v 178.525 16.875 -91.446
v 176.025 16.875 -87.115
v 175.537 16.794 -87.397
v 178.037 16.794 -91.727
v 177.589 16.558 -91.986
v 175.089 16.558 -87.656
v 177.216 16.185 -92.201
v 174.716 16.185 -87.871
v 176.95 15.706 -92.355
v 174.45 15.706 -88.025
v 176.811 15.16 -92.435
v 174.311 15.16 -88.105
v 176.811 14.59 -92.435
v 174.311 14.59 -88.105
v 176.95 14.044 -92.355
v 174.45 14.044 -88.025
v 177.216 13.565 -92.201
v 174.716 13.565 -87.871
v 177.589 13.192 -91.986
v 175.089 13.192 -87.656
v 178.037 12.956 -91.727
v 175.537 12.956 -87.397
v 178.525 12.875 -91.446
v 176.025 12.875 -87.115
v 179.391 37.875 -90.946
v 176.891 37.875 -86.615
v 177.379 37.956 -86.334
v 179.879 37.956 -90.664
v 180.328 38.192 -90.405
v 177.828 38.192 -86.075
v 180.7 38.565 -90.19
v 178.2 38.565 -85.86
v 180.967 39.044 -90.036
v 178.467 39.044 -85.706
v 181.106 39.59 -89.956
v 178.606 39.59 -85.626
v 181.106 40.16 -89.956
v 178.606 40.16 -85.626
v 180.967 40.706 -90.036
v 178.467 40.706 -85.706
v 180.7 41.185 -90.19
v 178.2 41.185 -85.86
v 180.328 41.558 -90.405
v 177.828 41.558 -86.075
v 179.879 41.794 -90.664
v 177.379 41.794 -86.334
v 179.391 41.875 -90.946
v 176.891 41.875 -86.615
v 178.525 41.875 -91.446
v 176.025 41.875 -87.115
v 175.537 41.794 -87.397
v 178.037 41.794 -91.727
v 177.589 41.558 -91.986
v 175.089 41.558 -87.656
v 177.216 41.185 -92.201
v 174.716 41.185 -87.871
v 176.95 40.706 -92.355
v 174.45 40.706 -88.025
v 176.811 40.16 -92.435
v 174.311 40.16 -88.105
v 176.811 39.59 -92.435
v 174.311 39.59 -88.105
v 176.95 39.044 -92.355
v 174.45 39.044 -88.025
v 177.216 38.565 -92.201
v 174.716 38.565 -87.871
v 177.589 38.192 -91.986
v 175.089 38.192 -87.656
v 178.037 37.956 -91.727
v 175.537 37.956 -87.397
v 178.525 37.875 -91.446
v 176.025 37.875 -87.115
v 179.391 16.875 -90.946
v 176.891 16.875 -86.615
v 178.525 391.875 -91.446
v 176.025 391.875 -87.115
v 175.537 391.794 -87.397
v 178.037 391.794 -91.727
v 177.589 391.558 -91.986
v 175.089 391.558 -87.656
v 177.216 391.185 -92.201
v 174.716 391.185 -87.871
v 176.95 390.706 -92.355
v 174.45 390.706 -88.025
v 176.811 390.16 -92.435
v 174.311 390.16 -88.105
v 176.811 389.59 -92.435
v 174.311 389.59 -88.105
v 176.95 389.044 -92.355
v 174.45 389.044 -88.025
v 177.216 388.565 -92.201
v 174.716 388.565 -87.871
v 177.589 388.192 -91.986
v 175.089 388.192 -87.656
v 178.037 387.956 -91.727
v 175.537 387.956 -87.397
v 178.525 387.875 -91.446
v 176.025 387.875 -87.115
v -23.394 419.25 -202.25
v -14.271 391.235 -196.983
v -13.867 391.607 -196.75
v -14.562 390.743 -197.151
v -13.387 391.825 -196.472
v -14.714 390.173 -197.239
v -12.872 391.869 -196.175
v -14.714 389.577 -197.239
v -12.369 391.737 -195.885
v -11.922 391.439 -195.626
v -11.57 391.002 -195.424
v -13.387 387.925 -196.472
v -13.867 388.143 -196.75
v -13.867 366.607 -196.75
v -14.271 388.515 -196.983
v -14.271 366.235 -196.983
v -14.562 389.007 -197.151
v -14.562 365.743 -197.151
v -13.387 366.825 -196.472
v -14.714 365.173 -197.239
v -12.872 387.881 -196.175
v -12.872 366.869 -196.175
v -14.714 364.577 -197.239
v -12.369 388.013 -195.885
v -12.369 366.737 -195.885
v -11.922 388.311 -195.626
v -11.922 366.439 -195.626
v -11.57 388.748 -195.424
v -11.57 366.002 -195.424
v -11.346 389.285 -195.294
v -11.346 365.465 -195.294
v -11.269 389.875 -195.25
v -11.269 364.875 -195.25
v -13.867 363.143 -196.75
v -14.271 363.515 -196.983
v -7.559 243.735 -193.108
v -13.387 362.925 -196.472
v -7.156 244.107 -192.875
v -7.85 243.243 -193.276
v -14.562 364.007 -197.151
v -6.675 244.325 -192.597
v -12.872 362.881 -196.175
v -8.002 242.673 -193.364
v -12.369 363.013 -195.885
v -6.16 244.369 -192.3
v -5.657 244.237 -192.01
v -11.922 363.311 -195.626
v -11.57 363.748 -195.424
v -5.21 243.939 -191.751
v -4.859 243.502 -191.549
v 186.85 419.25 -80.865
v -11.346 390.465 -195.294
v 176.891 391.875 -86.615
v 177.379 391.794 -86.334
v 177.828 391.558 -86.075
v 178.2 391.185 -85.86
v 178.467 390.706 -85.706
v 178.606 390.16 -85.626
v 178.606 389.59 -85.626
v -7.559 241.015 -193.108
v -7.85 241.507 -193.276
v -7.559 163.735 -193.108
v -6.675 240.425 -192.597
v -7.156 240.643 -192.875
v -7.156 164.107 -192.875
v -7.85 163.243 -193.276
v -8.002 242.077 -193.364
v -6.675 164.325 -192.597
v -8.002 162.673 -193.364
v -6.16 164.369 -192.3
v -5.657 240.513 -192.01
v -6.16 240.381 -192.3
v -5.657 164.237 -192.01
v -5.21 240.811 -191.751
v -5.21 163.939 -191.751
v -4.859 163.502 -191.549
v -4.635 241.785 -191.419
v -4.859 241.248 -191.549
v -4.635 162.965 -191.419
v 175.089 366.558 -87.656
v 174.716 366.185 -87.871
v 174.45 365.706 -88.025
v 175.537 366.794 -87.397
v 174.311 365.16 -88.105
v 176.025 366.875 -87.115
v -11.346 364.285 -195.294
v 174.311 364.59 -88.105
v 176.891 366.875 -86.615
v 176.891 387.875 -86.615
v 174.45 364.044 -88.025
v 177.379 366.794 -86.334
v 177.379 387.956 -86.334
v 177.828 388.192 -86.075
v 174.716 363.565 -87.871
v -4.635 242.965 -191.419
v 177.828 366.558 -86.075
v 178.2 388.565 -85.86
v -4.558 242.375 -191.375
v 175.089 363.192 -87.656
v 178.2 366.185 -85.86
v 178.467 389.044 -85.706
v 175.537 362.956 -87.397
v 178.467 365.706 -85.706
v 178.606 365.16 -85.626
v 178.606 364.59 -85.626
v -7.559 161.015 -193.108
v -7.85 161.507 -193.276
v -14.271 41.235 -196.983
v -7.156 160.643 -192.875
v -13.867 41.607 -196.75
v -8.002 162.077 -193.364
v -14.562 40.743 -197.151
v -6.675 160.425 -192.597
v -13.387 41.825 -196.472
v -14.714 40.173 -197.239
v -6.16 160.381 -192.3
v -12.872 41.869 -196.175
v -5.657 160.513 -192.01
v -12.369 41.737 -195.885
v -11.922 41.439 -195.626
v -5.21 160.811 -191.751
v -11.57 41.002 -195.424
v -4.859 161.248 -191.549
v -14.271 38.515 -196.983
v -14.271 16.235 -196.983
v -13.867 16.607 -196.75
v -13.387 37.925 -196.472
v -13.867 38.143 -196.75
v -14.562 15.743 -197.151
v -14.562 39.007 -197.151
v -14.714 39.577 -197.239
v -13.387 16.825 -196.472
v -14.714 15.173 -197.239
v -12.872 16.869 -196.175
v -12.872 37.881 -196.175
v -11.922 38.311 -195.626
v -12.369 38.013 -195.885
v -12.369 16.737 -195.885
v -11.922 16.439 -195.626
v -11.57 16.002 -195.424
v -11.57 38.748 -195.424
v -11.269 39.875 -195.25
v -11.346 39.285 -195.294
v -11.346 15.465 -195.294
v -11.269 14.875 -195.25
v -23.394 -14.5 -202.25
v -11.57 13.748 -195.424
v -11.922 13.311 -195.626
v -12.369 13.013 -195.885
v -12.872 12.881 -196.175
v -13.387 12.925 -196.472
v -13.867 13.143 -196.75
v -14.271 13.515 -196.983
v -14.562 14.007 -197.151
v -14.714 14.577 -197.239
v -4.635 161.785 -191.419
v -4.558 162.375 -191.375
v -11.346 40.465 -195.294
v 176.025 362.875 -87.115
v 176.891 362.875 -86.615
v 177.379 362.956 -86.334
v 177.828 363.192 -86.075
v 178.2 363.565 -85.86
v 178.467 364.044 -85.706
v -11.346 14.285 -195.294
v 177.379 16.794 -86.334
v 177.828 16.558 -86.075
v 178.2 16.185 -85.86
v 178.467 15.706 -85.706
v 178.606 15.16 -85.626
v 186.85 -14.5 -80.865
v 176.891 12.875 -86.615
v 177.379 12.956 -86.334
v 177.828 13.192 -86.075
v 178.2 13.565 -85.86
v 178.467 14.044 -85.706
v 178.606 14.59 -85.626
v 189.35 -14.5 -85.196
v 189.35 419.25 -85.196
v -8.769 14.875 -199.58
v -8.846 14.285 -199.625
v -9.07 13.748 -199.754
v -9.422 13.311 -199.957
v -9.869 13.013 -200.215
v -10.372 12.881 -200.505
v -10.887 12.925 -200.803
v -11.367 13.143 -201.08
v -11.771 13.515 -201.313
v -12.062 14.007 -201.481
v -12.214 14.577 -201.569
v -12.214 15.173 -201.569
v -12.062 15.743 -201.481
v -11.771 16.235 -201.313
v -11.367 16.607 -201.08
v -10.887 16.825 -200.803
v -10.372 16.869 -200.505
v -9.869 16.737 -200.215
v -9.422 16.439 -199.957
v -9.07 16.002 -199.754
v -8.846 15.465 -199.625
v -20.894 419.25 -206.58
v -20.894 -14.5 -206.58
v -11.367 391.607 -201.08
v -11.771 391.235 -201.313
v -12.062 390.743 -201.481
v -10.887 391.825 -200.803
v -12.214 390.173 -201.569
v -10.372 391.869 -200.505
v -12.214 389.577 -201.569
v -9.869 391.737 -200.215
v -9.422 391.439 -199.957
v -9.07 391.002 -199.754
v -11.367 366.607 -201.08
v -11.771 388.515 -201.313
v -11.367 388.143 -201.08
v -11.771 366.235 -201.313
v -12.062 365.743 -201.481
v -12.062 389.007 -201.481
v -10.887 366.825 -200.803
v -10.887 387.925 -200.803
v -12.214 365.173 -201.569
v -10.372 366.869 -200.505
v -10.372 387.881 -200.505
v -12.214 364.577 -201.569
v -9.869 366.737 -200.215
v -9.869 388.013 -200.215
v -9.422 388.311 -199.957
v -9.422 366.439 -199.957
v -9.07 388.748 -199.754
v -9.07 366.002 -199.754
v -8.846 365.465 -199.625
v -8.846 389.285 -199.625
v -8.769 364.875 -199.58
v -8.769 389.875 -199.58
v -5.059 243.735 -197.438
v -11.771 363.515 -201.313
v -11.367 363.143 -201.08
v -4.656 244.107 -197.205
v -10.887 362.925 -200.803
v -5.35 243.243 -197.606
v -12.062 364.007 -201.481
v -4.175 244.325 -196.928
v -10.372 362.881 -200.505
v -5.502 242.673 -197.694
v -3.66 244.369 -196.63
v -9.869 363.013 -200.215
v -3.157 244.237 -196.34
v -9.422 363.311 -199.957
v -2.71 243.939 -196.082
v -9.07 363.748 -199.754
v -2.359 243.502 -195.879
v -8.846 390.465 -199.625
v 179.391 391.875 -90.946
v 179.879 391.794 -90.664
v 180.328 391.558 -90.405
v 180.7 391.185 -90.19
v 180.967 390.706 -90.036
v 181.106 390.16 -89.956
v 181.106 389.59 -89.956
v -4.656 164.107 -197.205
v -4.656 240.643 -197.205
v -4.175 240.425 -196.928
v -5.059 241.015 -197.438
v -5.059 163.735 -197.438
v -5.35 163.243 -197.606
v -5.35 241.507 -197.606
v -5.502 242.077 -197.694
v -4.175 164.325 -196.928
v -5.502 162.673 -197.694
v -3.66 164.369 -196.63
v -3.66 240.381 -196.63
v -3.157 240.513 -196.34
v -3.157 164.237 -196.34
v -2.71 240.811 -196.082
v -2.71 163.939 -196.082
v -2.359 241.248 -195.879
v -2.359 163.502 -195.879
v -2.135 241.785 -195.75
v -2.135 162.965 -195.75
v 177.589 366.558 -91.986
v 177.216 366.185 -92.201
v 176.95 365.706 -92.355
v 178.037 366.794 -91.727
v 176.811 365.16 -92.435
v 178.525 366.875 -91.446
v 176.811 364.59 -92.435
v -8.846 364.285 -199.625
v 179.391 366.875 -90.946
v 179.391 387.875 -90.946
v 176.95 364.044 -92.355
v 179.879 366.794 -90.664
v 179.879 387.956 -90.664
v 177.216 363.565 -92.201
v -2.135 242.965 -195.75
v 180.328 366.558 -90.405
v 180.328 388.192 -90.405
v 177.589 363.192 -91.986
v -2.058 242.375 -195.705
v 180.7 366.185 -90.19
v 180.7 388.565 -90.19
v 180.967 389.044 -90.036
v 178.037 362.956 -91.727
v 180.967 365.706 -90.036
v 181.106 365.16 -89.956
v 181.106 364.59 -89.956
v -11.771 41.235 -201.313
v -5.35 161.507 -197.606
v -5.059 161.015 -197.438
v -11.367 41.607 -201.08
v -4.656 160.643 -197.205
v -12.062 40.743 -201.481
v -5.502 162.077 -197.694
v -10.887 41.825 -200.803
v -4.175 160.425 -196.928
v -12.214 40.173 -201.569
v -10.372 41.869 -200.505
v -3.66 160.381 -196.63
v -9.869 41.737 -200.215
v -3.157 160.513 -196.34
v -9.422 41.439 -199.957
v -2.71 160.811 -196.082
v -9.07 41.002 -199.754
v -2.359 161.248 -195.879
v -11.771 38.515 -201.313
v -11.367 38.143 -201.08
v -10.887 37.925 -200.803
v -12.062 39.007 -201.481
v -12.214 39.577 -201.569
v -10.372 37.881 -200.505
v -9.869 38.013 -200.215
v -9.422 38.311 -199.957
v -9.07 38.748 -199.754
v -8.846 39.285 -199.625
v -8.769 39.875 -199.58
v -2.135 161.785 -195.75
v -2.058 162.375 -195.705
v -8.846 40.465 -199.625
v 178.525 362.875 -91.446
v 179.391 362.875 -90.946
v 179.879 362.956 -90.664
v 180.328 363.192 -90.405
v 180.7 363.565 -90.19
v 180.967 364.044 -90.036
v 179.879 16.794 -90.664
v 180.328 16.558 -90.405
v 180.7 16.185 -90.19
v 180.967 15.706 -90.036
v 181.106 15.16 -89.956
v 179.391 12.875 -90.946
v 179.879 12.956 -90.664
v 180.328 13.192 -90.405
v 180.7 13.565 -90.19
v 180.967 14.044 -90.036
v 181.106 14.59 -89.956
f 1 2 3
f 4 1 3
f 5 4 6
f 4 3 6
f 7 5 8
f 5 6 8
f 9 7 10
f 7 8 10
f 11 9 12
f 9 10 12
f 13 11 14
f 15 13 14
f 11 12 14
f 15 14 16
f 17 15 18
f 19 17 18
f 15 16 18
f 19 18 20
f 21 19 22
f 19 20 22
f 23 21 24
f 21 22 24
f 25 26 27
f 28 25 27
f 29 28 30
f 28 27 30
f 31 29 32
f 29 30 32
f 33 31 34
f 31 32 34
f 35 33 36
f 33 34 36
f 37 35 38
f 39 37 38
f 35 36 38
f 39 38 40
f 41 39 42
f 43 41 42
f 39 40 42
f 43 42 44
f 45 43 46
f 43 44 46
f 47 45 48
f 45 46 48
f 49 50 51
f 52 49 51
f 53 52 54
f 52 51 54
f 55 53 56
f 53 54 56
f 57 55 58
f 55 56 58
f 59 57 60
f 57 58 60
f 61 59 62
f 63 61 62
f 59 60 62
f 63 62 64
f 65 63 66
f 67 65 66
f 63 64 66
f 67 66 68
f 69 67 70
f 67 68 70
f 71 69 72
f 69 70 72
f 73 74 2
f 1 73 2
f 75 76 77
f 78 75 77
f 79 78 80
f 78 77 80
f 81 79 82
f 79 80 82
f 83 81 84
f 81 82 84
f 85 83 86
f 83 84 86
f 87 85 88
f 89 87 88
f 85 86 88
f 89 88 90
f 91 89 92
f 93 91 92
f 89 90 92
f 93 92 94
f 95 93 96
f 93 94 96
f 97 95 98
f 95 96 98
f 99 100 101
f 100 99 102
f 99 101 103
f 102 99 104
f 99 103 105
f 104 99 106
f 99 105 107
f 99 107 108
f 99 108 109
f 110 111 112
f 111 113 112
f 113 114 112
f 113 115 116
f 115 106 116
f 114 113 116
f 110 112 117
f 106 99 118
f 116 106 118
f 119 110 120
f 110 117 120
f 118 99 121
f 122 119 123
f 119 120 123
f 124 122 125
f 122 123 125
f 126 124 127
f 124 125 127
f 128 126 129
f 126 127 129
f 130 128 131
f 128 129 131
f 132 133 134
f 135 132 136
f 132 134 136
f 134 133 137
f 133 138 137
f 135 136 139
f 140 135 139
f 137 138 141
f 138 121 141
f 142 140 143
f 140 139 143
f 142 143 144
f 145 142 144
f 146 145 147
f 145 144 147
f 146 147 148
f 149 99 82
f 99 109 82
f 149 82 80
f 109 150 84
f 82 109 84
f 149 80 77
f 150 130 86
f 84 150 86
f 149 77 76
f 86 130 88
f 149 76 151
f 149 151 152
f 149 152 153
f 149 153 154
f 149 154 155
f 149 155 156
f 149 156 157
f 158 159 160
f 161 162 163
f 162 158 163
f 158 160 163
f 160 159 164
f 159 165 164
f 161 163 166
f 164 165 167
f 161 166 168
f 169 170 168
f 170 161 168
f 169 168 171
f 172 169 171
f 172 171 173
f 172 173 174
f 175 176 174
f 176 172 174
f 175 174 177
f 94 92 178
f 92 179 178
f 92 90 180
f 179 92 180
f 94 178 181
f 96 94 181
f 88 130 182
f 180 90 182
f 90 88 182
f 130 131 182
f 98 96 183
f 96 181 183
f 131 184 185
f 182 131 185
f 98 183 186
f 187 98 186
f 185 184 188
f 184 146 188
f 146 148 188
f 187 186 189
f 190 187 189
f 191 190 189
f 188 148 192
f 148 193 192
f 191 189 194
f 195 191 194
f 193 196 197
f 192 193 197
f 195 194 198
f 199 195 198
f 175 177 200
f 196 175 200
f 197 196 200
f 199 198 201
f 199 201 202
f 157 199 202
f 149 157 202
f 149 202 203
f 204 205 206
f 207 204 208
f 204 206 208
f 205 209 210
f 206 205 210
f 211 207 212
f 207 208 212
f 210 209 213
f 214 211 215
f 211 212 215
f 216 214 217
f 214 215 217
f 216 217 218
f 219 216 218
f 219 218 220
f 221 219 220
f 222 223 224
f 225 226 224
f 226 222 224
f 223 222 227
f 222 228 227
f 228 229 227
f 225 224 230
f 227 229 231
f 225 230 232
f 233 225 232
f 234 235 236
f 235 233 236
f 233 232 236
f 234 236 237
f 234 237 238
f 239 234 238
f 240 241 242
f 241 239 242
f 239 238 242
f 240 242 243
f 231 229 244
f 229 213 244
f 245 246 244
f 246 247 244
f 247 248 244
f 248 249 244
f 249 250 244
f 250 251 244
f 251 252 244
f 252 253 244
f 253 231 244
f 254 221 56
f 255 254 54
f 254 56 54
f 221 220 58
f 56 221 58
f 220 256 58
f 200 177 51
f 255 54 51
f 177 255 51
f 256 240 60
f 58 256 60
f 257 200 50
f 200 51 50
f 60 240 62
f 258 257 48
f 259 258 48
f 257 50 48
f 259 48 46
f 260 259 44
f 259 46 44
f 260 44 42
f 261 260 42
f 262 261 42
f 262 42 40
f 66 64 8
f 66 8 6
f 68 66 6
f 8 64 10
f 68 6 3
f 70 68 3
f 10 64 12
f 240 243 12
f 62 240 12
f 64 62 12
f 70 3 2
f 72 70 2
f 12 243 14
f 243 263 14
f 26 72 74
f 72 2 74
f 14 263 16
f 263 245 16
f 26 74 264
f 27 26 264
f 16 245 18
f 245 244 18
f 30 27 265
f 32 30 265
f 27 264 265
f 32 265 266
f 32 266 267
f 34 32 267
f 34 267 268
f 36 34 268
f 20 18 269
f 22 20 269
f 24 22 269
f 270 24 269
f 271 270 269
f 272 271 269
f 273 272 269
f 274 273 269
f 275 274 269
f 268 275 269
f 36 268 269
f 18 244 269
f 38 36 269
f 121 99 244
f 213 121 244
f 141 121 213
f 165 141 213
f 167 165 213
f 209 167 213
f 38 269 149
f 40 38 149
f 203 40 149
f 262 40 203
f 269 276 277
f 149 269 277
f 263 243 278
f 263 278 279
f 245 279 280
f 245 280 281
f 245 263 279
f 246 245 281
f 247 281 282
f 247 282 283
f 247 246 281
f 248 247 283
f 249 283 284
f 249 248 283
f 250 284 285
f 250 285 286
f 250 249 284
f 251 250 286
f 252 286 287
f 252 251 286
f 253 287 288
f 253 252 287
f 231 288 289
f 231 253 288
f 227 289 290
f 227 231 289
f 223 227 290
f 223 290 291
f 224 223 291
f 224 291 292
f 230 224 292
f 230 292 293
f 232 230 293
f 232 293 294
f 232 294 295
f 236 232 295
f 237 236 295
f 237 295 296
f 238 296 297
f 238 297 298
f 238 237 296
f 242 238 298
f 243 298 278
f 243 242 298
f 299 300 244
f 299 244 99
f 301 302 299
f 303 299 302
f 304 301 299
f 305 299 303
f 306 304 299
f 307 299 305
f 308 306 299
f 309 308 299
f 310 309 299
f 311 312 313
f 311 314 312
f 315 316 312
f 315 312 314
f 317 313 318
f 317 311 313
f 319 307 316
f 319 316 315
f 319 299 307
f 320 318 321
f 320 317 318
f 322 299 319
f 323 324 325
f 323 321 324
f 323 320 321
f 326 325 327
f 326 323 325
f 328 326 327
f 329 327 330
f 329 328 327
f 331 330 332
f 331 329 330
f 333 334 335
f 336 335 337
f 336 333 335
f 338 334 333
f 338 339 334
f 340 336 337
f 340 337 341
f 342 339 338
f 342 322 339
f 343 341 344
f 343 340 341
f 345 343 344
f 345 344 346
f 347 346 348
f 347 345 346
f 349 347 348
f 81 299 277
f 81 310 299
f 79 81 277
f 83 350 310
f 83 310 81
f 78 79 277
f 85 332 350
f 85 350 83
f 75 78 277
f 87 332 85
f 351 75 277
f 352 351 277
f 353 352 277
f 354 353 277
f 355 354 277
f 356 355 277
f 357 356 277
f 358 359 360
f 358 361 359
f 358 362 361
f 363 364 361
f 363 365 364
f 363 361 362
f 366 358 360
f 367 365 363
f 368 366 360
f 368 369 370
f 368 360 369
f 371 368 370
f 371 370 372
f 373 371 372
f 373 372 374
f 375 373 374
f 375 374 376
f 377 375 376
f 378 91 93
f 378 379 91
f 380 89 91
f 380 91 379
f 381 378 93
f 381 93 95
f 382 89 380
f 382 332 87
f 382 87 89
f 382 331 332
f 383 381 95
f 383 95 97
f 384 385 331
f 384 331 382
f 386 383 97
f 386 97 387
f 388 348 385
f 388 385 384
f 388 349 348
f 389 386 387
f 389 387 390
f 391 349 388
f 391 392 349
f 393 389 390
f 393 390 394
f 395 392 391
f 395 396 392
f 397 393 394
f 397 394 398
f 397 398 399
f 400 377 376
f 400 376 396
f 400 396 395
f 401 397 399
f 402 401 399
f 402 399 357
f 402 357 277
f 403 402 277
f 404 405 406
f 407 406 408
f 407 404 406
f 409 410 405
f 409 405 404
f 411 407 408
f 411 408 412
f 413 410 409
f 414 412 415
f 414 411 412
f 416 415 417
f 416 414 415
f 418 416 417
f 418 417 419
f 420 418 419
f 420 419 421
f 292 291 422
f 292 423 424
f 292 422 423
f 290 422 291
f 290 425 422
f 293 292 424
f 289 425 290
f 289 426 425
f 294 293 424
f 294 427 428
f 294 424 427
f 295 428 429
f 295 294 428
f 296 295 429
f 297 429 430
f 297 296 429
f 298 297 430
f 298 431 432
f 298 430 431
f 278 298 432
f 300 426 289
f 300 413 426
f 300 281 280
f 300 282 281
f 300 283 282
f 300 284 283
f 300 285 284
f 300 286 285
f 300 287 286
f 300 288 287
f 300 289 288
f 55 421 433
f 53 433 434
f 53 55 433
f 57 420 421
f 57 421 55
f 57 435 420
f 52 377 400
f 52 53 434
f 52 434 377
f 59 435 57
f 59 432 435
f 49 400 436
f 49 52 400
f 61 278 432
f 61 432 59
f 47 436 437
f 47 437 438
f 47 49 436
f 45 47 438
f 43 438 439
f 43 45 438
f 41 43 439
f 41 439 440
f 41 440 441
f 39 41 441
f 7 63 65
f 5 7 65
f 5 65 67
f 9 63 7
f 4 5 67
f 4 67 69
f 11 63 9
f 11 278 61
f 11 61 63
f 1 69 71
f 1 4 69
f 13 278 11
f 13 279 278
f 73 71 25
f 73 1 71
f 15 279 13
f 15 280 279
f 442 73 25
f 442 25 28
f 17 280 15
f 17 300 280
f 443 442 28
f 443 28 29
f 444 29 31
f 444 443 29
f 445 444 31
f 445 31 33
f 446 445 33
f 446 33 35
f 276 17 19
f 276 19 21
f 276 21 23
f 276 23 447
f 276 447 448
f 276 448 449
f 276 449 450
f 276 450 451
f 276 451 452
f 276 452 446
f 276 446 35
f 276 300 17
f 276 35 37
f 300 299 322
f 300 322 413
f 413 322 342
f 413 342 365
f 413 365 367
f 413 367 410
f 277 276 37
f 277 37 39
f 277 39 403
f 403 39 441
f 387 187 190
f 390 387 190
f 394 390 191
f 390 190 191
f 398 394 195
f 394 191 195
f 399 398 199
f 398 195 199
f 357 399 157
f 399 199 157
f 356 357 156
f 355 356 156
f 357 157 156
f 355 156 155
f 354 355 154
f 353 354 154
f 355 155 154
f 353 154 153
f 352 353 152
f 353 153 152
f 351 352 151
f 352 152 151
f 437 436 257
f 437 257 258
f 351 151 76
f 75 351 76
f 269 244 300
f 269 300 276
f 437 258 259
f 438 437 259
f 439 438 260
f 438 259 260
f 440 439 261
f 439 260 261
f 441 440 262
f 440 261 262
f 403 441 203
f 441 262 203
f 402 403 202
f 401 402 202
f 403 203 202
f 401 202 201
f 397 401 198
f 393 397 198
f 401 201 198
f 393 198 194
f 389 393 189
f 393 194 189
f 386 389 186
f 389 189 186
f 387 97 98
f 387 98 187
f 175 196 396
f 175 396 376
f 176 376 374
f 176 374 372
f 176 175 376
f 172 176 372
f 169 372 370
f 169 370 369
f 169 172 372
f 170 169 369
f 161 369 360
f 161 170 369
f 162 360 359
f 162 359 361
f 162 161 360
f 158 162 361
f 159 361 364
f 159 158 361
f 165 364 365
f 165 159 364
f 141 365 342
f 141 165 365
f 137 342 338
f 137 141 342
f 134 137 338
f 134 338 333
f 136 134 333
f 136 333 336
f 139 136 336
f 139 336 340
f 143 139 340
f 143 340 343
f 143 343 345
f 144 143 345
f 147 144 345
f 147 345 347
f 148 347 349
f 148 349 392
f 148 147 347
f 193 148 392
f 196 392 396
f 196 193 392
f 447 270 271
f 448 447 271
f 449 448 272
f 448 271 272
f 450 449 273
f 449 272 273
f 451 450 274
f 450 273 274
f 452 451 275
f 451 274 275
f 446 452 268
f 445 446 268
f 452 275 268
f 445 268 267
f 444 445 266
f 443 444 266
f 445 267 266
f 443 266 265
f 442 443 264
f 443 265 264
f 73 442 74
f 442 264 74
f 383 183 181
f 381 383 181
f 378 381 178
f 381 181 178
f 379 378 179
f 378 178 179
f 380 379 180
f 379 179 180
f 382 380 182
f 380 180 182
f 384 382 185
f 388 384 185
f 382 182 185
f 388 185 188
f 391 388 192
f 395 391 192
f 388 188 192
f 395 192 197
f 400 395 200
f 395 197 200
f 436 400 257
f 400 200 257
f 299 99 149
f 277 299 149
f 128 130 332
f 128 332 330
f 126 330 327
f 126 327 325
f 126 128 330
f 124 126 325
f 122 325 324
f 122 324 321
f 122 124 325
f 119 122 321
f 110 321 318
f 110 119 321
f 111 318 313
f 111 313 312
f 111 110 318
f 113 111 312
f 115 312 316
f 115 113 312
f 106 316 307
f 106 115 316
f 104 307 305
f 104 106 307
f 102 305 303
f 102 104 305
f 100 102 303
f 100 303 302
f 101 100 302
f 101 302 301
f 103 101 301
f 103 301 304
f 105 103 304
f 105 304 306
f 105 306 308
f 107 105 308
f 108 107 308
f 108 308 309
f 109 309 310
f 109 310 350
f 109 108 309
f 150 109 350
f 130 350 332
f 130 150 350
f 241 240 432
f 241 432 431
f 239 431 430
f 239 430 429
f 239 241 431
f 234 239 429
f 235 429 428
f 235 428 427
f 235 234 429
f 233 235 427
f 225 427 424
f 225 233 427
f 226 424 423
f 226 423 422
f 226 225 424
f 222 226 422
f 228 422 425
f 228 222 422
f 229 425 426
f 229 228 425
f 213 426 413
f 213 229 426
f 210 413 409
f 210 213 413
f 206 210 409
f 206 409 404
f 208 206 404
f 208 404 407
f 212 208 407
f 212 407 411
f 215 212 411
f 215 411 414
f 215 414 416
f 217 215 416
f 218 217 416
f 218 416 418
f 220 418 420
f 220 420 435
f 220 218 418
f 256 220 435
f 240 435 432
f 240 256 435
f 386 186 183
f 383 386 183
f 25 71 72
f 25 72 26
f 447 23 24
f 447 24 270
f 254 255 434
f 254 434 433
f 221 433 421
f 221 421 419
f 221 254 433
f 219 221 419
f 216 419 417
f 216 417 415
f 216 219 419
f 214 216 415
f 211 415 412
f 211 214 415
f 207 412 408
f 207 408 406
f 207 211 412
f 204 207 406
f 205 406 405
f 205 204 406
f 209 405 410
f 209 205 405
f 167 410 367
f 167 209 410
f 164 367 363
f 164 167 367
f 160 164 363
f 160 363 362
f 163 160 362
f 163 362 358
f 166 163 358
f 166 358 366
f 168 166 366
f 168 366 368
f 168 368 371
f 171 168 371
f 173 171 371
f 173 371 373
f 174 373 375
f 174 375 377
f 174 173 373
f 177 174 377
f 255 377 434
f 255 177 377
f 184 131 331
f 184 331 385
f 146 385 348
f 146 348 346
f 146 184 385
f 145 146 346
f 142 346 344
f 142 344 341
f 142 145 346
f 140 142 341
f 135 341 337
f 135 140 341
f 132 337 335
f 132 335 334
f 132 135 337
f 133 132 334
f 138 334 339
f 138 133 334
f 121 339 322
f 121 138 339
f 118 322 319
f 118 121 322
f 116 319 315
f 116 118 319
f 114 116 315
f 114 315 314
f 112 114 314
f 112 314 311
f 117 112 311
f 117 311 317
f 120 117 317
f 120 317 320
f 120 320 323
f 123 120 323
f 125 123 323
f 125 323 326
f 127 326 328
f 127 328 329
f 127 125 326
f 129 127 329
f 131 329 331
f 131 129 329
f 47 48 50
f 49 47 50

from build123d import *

# Parameters (mm, degrees)
STOCK_ACRYLIC_DOOR_MASTER_1_START     = 163.456714755
STOCK_ACRYLIC_DOOR_MASTER_1_OUTLINE_W = 243.269145362
STOCK_ACRYLIC_DOOR_MASTER_1_OUTLINE_H = 433.75
STOCK_ACRYLIC_DOOR_MASTER_1_OUTLINE_R = 2
STOCK_ACRYLIC_DOOR_MASTER_1_DEPTH     = 5
SKETCH1_W                             = 0.25
SKETCH1_H                             = 433.75
CUT_EXTRUDE1_DEPTH                    = 438.771536387


# Read off the part's stored shape, not the designer's step: Stock-acrylic-door-master-1
with BuildPart() as part:
    # Stock-acrylic-door-master-1 outline → Stock-acrylic-door-master-1 (new body)
    with BuildSketch(Plane(origin=(0, 0, 0), x_dir=(0.866025403784438, 0, 0.500000000000001), z_dir=(0.500000000000001, 0, -0.866025403784438)).offset(STOCK_ACRYLIC_DOOR_MASTER_1_START)):
        with Locations((0, -202.375)):
            Rectangle(STOCK_ACRYLIC_DOOR_MASTER_1_OUTLINE_W, STOCK_ACRYLIC_DOOR_MASTER_1_OUTLINE_H)
        with Locations((-109.384572681, -389.875)):
            Circle(STOCK_ACRYLIC_DOOR_MASTER_1_OUTLINE_R, mode=Mode.SUBTRACT)
        with Locations((-109.384572681, -364.875)):
            Circle(STOCK_ACRYLIC_DOOR_MASTER_1_OUTLINE_R, mode=Mode.SUBTRACT)
        with Locations((-101.634572681, -242.375)):
            Circle(STOCK_ACRYLIC_DOOR_MASTER_1_OUTLINE_R, mode=Mode.SUBTRACT)
        with BuildLine():
            Line((108.884572681, -387.875), (109.884572681, -387.875))
            ThreePointArc((109.884572681, -387.875), (111.884572681, -389.875), (109.884572681, -391.875))
            Line((109.884572681, -391.875), (108.884572681, -391.875))
            ThreePointArc((108.884572681, -391.875), (106.884572681, -389.875), (108.884572681, -387.875))
        make_face(mode=Mode.SUBTRACT)
        with BuildLine():
            Line((108.884572681, -362.875), (109.884572681, -362.875))
            ThreePointArc((109.884572681, -362.875), (111.884572681, -364.875), (109.884572681, -366.875))
            Line((109.884572681, -366.875), (108.884572681, -366.875))
            ThreePointArc((108.884572681, -366.875), (106.884572681, -364.875), (108.884572681, -362.875))
        make_face(mode=Mode.SUBTRACT)
        with Locations((-101.634572681, -162.375)):
            Circle(STOCK_ACRYLIC_DOOR_MASTER_1_OUTLINE_R, mode=Mode.SUBTRACT)
        with Locations((-109.384572681, -39.875)):
            Circle(STOCK_ACRYLIC_DOOR_MASTER_1_OUTLINE_R, mode=Mode.SUBTRACT)
        with Locations((-109.384572681, -14.875)):
            Circle(STOCK_ACRYLIC_DOOR_MASTER_1_OUTLINE_R, mode=Mode.SUBTRACT)
        with BuildLine():
            Line((108.884572681, -37.875), (109.884572681, -37.875))
            ThreePointArc((109.884572681, -37.875), (111.884572681, -39.875), (109.884572681, -41.875))
            Line((109.884572681, -41.875), (108.884572681, -41.875))
            ThreePointArc((108.884572681, -41.875), (106.884572681, -39.875), (108.884572681, -37.875))
        make_face(mode=Mode.SUBTRACT)
        with BuildLine():
            Line((108.884572681, -12.875), (109.884572681, -12.875))
            ThreePointArc((109.884572681, -12.875), (111.884572681, -14.875), (109.884572681, -16.875))
            Line((109.884572681, -16.875), (108.884572681, -16.875))
            ThreePointArc((108.884572681, -16.875), (106.884572681, -14.875), (108.884572681, -12.875))
        make_face(mode=Mode.SUBTRACT)
    extrude(amount=STOCK_ACRYLIC_DOOR_MASTER_1_DEPTH)

    # Sketch1 → Cut-Extrude1 (cut, through all)
    with BuildSketch(Plane(origin=(84.228357378, 0, -145.887794416), x_dir=(-0.866025403784438, 0, -0.5000000000000012), z_dir=(0.5000000000000011, 0, -0.8660254037844379))):
        with Locations((-121.509572681, 202.375)):
            Rectangle(SKETCH1_W, SKETCH1_H)
        with Locations((121.509572681, 202.375)):
            Rectangle(SKETCH1_W, SKETCH1_H)
    extrude(amount=-CUT_EXTRUDE1_DEPTH, mode=Mode.SUBTRACT)


solid = part.part
